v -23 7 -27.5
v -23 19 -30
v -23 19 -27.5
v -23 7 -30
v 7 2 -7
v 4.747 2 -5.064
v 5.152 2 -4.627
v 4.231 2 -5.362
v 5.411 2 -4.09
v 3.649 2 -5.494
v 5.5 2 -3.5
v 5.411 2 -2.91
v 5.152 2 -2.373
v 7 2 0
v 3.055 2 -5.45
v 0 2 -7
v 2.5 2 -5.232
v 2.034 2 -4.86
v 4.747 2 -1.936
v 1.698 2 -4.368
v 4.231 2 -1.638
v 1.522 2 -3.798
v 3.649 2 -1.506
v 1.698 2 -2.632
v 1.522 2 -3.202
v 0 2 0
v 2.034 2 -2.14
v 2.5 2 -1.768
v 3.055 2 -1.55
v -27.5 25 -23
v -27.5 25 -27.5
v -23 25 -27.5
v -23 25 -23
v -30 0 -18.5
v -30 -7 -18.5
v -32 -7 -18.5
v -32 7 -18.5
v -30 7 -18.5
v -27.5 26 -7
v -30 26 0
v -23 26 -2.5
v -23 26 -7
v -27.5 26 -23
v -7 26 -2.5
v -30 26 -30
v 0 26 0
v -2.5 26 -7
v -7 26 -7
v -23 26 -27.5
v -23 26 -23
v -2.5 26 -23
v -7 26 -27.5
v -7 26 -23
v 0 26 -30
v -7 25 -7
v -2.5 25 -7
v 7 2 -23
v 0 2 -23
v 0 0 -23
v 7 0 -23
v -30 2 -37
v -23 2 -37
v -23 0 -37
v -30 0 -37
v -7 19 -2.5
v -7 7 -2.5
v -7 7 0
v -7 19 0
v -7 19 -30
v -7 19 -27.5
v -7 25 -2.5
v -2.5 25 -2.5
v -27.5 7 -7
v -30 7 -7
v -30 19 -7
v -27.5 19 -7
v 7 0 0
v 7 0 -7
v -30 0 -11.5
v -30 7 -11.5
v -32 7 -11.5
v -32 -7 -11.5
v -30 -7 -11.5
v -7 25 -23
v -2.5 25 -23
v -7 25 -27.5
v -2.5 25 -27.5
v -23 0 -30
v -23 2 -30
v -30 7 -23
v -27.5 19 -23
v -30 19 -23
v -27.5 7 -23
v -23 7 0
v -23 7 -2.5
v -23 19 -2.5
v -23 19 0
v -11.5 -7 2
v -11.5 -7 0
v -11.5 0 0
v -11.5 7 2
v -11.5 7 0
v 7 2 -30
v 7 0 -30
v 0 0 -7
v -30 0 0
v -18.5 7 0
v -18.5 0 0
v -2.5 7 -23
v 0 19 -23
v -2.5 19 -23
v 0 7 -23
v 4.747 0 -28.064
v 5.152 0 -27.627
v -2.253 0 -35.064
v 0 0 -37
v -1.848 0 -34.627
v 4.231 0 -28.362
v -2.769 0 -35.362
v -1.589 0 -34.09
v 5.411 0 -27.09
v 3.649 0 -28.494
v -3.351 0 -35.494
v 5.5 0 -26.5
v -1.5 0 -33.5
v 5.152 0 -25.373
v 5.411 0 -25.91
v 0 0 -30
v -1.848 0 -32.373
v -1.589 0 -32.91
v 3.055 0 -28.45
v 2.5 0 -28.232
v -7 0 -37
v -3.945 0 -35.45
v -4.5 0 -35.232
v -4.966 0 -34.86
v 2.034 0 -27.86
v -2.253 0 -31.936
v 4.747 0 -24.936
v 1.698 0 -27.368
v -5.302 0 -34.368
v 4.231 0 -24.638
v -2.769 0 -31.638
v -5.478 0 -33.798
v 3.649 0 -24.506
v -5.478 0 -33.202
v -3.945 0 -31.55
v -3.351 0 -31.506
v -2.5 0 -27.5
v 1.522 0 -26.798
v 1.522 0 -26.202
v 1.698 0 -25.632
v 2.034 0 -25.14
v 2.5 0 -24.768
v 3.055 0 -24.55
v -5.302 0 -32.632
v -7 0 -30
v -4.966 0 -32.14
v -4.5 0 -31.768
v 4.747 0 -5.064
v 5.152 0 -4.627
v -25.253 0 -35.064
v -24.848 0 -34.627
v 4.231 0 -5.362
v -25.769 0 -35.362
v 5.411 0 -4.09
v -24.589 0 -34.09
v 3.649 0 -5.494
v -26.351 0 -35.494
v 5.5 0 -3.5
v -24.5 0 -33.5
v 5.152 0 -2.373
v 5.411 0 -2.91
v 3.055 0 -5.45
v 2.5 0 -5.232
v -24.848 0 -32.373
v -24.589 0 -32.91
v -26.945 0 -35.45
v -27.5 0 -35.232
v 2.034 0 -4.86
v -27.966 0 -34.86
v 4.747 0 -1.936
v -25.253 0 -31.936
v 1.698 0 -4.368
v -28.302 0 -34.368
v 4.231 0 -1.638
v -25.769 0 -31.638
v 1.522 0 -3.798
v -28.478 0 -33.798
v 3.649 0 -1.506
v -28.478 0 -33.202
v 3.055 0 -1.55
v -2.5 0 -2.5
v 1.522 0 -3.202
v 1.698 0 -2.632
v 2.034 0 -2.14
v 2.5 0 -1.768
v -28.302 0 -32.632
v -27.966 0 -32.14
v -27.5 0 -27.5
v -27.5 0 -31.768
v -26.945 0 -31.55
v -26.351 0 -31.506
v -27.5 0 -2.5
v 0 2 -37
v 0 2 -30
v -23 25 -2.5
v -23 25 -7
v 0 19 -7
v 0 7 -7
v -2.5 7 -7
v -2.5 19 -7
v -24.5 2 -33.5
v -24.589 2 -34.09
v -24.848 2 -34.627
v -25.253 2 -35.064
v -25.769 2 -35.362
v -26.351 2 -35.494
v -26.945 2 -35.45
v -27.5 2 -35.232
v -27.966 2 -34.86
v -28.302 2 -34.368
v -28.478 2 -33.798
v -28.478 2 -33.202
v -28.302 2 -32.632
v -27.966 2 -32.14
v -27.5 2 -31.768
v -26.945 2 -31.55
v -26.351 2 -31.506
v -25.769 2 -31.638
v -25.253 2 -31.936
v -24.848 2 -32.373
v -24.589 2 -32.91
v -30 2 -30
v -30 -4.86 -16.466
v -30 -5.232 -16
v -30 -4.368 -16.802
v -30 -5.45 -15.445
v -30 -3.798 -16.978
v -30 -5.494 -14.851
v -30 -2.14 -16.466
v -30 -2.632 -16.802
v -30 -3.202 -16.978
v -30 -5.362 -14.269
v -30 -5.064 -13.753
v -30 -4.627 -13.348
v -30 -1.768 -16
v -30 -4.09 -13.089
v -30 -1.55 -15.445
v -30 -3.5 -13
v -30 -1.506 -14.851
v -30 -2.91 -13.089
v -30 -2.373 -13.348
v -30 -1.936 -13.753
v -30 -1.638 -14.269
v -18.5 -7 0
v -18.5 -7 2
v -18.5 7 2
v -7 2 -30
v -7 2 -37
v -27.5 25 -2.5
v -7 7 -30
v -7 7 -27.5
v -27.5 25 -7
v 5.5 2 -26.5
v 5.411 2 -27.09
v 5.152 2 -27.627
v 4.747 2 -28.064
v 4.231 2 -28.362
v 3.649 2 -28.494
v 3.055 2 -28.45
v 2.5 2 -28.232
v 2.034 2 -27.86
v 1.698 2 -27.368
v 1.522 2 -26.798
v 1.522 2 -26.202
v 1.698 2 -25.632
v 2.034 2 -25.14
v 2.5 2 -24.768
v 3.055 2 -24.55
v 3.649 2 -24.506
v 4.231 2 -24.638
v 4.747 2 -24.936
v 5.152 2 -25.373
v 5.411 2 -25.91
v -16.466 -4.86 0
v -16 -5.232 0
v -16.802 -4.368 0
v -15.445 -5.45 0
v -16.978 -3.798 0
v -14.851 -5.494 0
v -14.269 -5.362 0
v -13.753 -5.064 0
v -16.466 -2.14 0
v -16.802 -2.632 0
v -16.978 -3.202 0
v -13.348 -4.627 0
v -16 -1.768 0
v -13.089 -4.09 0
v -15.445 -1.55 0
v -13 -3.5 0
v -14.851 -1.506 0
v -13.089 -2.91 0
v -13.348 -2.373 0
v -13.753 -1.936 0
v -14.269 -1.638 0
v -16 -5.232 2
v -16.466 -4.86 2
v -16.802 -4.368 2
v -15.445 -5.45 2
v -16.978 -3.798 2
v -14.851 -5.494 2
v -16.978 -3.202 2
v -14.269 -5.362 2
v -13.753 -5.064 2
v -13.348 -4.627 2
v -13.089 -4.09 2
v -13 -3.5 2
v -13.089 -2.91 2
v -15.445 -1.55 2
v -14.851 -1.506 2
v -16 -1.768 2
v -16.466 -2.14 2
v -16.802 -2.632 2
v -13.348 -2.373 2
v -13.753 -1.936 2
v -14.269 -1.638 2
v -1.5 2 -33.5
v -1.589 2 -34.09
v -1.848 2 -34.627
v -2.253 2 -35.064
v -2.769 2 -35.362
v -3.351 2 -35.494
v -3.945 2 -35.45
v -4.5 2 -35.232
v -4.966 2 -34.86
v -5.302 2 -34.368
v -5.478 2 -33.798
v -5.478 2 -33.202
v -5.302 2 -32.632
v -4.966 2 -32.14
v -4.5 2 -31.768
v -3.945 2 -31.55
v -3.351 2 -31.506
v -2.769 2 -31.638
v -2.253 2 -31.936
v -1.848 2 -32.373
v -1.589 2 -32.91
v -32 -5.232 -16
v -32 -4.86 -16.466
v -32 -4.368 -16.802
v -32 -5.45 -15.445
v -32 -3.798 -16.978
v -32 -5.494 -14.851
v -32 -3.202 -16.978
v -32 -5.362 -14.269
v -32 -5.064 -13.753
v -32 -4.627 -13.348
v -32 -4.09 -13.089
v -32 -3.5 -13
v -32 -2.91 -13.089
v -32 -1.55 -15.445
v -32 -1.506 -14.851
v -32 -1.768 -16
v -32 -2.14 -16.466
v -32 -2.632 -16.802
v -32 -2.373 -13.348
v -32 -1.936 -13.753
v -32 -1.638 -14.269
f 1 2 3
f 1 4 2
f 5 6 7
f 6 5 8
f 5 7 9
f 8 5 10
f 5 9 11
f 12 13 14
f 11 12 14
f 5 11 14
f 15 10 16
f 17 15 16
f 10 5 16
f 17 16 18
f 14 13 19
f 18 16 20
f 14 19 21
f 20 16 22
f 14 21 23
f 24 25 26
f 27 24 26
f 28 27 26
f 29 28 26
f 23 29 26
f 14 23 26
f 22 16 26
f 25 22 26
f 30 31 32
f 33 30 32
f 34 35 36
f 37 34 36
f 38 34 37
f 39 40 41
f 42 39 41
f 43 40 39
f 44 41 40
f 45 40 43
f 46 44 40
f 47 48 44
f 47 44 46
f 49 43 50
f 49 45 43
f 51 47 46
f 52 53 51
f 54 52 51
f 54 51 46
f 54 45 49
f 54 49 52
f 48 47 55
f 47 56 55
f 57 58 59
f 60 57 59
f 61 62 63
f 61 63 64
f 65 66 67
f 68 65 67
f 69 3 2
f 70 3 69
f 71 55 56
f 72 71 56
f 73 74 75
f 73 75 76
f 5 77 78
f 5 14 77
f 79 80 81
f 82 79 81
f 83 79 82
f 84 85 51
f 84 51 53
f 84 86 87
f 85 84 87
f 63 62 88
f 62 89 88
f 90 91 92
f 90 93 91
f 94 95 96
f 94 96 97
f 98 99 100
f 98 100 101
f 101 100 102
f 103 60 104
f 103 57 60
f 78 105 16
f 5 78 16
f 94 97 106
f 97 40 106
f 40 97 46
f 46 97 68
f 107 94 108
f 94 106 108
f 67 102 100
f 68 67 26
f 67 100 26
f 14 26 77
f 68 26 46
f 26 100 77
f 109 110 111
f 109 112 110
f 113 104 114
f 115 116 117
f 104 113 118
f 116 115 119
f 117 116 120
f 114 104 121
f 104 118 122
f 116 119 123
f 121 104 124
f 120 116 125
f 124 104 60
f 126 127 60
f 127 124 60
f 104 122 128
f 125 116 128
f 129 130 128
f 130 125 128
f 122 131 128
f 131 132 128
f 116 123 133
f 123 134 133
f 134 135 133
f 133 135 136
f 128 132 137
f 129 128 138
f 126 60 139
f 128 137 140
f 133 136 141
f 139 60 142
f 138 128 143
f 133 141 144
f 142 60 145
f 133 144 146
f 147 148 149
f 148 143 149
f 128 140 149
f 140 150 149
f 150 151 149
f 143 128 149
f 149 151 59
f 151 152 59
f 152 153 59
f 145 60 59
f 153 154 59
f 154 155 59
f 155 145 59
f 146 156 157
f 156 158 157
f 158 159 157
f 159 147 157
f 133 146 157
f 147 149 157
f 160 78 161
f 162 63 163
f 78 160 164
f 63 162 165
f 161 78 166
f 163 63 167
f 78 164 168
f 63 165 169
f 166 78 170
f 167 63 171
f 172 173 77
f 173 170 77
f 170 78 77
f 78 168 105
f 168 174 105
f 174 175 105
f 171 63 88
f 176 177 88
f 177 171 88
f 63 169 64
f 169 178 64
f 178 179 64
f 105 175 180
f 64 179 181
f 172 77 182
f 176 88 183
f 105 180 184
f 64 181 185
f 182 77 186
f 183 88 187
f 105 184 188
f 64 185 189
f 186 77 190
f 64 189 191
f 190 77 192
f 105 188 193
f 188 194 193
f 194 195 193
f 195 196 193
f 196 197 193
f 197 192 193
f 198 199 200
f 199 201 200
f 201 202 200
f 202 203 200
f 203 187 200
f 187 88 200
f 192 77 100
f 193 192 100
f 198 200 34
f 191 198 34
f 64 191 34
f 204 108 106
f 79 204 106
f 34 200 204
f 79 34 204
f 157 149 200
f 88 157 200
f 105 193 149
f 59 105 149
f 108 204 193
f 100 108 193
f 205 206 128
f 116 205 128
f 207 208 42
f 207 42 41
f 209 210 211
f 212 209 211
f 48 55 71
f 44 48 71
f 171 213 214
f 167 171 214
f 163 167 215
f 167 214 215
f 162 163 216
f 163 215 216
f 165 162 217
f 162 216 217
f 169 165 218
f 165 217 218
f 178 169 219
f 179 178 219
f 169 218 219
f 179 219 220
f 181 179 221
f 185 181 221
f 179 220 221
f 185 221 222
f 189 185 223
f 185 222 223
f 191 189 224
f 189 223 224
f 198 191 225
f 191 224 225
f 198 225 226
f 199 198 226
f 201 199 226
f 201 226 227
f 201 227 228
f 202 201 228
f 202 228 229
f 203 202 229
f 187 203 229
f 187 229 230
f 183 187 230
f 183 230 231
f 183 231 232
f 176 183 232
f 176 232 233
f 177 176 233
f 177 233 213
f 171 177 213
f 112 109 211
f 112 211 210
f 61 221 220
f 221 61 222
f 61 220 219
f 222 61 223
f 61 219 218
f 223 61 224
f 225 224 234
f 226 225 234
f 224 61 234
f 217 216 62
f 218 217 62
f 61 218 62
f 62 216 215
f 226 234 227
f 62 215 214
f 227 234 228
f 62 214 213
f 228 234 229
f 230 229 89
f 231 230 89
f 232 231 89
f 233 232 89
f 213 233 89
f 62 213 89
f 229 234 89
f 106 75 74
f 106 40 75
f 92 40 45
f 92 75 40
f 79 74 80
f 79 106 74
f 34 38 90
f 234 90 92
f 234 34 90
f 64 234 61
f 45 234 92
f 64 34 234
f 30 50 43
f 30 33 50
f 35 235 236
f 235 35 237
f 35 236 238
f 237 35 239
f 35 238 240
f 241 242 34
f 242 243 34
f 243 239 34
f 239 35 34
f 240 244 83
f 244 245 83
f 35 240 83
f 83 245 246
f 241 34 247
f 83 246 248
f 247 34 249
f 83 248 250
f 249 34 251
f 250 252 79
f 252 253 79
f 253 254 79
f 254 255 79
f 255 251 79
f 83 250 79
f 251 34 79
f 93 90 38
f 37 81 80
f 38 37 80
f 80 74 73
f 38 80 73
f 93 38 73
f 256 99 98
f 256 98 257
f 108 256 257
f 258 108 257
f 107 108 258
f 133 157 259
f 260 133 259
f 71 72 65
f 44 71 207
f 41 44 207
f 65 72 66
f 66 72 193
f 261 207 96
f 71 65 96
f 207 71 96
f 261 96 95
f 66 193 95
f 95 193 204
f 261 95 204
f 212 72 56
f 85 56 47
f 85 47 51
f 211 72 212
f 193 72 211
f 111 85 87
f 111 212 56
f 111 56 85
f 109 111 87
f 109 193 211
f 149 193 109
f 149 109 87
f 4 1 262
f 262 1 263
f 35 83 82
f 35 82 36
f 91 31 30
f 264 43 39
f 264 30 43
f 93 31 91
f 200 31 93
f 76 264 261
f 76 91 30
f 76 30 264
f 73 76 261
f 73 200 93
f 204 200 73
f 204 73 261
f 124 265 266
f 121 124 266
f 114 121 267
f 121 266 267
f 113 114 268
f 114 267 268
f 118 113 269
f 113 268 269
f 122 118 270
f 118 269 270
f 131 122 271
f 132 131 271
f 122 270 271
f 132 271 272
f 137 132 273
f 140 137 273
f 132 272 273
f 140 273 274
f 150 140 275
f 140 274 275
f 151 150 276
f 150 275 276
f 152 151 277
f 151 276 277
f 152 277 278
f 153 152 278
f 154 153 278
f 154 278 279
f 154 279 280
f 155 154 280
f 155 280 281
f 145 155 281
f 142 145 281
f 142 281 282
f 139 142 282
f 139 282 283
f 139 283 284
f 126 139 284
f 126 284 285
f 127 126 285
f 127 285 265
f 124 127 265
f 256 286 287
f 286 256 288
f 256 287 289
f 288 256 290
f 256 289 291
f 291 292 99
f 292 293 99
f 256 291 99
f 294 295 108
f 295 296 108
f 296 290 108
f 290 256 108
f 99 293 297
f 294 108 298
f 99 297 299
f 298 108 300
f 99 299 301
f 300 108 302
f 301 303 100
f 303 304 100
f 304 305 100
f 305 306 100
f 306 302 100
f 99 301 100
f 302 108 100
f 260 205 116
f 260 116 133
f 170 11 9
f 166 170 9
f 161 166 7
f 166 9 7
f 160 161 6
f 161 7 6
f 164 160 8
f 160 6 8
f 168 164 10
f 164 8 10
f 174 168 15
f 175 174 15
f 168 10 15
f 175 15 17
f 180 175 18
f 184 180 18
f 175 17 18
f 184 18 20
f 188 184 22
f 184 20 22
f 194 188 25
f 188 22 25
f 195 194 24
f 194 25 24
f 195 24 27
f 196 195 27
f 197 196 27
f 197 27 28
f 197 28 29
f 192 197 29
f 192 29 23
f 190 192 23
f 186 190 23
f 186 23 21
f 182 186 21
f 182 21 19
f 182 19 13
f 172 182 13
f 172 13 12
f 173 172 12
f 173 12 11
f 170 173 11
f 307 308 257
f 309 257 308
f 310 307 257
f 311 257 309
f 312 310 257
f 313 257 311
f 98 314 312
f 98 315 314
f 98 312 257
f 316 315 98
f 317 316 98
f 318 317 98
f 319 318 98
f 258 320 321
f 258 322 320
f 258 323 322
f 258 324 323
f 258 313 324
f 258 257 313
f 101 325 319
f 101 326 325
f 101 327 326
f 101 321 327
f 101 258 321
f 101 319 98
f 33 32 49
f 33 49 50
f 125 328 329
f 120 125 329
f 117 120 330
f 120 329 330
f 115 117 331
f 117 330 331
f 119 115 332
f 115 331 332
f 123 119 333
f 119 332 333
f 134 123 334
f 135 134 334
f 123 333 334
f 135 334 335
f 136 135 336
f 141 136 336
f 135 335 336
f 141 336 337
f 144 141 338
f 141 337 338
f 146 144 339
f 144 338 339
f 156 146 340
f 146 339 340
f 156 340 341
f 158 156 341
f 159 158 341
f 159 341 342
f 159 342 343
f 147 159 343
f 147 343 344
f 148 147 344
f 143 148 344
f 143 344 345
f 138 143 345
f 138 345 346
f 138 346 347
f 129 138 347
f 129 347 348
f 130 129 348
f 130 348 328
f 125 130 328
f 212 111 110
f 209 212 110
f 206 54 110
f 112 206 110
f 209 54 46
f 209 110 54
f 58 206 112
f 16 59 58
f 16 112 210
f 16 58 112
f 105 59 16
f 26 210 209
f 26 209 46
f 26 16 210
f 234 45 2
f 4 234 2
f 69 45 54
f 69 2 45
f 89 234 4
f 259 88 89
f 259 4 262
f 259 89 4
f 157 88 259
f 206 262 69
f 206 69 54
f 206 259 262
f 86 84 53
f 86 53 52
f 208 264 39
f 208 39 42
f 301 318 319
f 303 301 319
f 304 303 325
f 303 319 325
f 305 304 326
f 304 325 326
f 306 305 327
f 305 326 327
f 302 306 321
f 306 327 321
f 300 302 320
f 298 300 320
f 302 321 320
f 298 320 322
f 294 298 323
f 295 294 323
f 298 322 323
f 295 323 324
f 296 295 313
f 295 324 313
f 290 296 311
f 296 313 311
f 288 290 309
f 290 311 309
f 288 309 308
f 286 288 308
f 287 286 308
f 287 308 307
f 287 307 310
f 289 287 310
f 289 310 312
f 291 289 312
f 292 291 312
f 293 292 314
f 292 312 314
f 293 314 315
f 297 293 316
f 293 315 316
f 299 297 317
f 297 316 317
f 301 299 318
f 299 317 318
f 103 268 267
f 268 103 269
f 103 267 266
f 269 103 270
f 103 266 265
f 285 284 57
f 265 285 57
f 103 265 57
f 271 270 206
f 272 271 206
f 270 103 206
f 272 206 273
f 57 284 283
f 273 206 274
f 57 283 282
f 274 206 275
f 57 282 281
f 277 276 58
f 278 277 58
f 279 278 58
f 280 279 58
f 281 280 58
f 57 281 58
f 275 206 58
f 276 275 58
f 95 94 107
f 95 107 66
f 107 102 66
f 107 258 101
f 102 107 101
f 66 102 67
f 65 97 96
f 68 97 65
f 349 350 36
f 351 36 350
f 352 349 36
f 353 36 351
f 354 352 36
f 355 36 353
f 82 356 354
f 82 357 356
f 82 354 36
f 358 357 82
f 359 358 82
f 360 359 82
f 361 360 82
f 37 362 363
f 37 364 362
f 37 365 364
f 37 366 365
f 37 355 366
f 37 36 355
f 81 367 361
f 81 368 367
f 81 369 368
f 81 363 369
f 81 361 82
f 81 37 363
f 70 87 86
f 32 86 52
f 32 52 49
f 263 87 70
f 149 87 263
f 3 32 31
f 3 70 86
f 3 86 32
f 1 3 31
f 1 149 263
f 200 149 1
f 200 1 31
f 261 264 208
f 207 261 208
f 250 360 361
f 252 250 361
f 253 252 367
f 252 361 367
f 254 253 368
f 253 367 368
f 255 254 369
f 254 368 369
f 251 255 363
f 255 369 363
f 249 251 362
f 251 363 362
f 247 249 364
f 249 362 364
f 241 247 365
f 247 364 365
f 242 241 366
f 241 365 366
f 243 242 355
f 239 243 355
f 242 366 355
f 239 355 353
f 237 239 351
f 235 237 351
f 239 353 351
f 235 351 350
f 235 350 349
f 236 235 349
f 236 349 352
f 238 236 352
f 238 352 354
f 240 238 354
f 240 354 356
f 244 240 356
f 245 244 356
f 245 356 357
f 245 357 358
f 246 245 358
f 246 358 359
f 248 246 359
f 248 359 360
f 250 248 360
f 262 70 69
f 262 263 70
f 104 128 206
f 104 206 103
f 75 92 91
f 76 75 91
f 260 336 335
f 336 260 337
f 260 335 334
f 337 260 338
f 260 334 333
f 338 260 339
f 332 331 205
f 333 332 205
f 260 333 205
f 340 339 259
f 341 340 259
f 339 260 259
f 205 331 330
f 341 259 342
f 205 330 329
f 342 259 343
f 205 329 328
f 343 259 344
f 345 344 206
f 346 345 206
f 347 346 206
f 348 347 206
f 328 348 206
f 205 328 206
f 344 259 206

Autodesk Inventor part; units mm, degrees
ref_plane "YZ Plane" through (0, 0, 0) normal (1, 0, 0) x (0, 1, 0)
ref_plane "XZ Plane" through (0, 0, 0) normal (0, 1, 0) x (-1, 0, 0)
ref_plane "XY Plane" through (0, 0, 0) normal (0, 0, 1) x (1, 0, 0)
sketch "Sketch1" plane through (0, 0, 0) normal (0, 1, 0) x (-1, 0, 0)
  line L0 (0, 0) -> (0, -7)
  line L1 (0, -7) -> (2.5, -7)
  line L2 (2.5, -7) -> (2.5, -2.5)
  line L3 (2.5, -2.5) -> (7, -2.5)
  line L4 (7, -2.5) -> (7, 0)
  line L5 (7, 0) -> (0, 0)
  line L6 (0, -30) -> (0, -23)
  line L7 (0, -23) -> (2.5, -23)
  line L8 (2.5, -23) -> (2.5, -27.5)
  line L9 (2.5, -27.5) -> (7, -27.5)
  line L10 (7, -27.5) -> (7, -30)
  line L11 (7, -30) -> (0, -30)
  line L12 (23, 0) -> (30, 0)
  line L13 (30, 0) -> (30, -7)
  line L14 (30, -7) -> (27.5, -7)
  line L15 (27.5, -7) -> (27.5, -2.5)
  line L16 (27.5, -2.5) -> (23, -2.5)
  line L17 (23, -2.5) -> (23, 0)
  line L18 (30, -23) -> (30, -30)
  line L19 (30, -30) -> (23, -30)
  line L20 (23, -30) -> (23, -27.5)
  line L21 (23, -27.5) -> (27.5, -27.5)
  line L22 (27.5, -27.5) -> (27.5, -23)
  line L23 (27.5, -23) -> (30, -23)
  dimension "d0" = 7
  dimension "d1" = 2.5
  dimension "d2" = 4.5
  dimension "d3" = 4.5
  dimension "d8" = 7
  dimension "d9" = 4.5
  dimension "d10" = 7
  dimension "d11" = 7
  dimension "d12" = 2.5
  dimension "d13" = 30
  dimension "d14" = 30
  dimension "d15" = 30
  dimension "d16" = 2.5
  dimension "d17" = 2.5
  dimension "d18" = 4.5
  dimension "d19" = 7
extrude "Extrusion1" add sketch "Sketch1" along normal blind 25
sketch "Sketch2" plane through (0, 0, 0) normal (0, -1, 0) x (1, 0, 0)
  line L0 (0, 0) -> (-30, 0)
  line L1 (-30, 0) -> (-30, -30)
  line L2 (-30, -30) -> (0, -30)
  line L3 (0, -30) -> (0, 0)
  line L4 (-27.5, -2.5) -> (-2.5, -2.5)
  line L5 (-2.5, -2.5) -> (-2.5, -27.5)
  line L6 (-2.5, -27.5) -> (-27.5, -27.5)
  line L7 (-27.5, -27.5) -> (-23, -27.5) projected
  line L8 (-27.5, -27.5) -> (-27.5, -2.5)
extrude "Extrusion2" add sketch "Sketch2" against normal blind 7
sketch "Sketch3" plane through (0, 25, 0) normal (0, 1, 0) x (1, 0, 0)
  line L0 (0, 0) -> (-7, 0)
  line L1 (0, 0) -> (-30, 0) projected
  line L2 (-7, 0) -> (-7, 7)
  line L3 (-7, 7) -> (0, 7)
  line L4 (0, 7) -> (0, 0)
  line L5 (0, 30) -> (-7, 30)
  line L6 (-7, 30) -> (-7, 23)
  line L7 (-7, 23) -> (0, 23)
  line L8 (-2.5, 23) -> (0, 23) projected
  line L9 (0, 23) -> (0, 30)
  line L10 (0, 23) -> (0, 30) projected
  line L11 (-30, 30) -> (-30, 23)
  line L12 (-30, 0) -> (-30, 30) projected
  line L13 (-30, 23) -> (-23, 23)
  line L14 (-23, 23) -> (-23, 30)
  line L15 (-23, 30) -> (-30, 30)
  line L16 (-30, 30) -> (0, 30) projected
  line L17 (-30, 0) -> (-23, 0)
  line L18 (-23, 0) -> (-23, 7)
  line L19 (-23, 7) -> (-30, 7)
  line L20 (-27.5, 7) -> (-30, 7) projected
  line L21 (-30, 7) -> (-30, 0)
  dimension "d24" = 7
  dimension "d25" = 7
  dimension "d26" = 7
  dimension "d27" = 7
  dimension "d28" = 7
extrude "Extrusion3" add sketch "Sketch3" along normal blind 1
sketch "Sketch4" plane through (0, 0, 0) normal (1, 0, 0) x (0, 0, -1)
  line L0 (0, 0) -> (7, 0)
  line L1 (27.5, 0) -> (2.5, 0) projected
  line L2 (7, 0) -> (7, 2)
  line L3 (7, 2) -> (0, 2)
  line L4 (0, 2) -> (0, 0)
  line L5 (30, 0) -> (30, 2)
  line L6 (30, 0) -> (30, 26) projected
  line L7 (30, 2) -> (23, 2)
  line L8 (23, 2) -> (23, 0)
  line L9 (0, 0) -> (30, 0) projected
  line L10 (23, 0) -> (30, 0)
  dimension "d31" = 7
  dimension "d32" = 2
  dimension "d33" = 2
  dimension "d34" = 7
sketch "Sketch5" plane through (0, 0, -30) normal (0, 0, -1) x (-1, 0, 0)
  line L0 (0, 0) -> (7, 0)
  line L1 (7, 0) -> (7, 2)
  line L2 (7, 2) -> (0, 2)
  line L3 (0, 2) -> (0, 0)
  line L4 (30, 0) -> (30, 2)
  line L5 (30, 0) -> (30, 26) projected
  line L6 (30, 2) -> (23, 2)
  line L7 (23, 2) -> (23, 0)
  line L8 (23, 0) -> (30, 0)
  line L9 (30, 0) -> (0, 0) projected
  dimension "d35" = 7
  dimension "d36" = 2
  dimension "d37" = 2
  dimension "d38" = 7
extrude "Extrusion4" add sketch "Sketch4" along normal blind 7
extrude "Extrusion5" add sketch "Sketch5" along normal blind 7
sketch "Sketch6" plane through (0, 2, 0) normal (0, 1, 0) x (1, 0, 0)
  circle A0 centre (3.5, 3.5) radius 2
  line L0 (7, 7) -> (7, 0) projected
  line L1 (0, 0) -> (7, 0) projected
  point P0 (7, 3.5)
  point P1 (3.5, 0)
  dimension "d43" = 4
sketch "Sketch7" plane through (0, 2, -23) normal (0, 1, 0) x (1, 0, 0)
  circle A0 centre (3.5, 3.5) radius 2
  line L0 (7, 7) -> (7, 0) projected
  line L1 (0, 0) -> (7, 0) projected
  point P0 (0, -23)
  point P1 (7, 3.5)
  point P2 (3.5, 0)
  dimension "d44" = 4
sketch "Sketch8" plane through (-7, 2, -30) normal (0, 1, 0) x (1, 0, 0)
  circle A0 centre (3.5, 3.5) radius 2
  circle A1 centre (-19.5, 3.5) radius 2
  line L0 (7, 0) -> (7, 7) projected
  line L1 (7, 0) -> (0, 0) projected
  line L2 (-23, 0) -> (-23, 7) projected
  line L3 (-23, 7) -> (-16, 7) projected
  point P0 (7, -30)
  point P1 (7, 3.5)
  point P2 (3.5, 0)
  point P3 (-23, 3.5)
  point P4 (-19.5, 7)
  dimension "d45" = 4
  dimension "d46" = 4
extrude "Extrusion6" cut sketch "Sketch6" against normal blind 2
extrude "Extrusion7" cut sketch "Sketch7" against normal blind 2
extrude "Extrusion8" cut sketch "Sketch8" against normal blind 2
sketch "Sketch9" plane through (0, 25, 0) normal (0, -1, 0) x (1, 0, 0)
  line L0 (0, -30) -> (0, 0)
  line L1 (0, 0) -> (-30, 0)
  line L2 (-30, 0) -> (-30, -30)
  line L3 (-30, 0) -> (-30, -37) projected
  line L4 (-2.5, -2.5) -> (-2.5, -27.5)
  line L5 (-2.5, -27.5) -> (-27.5, -27.5)
  line L6 (-27.5, -27.5) -> (-23, -27.5) projected
  line L7 (-27.5, -27.5) -> (-27.5, -2.5)
  line L8 (-27.5, -2.5) -> (-2.5, -2.5)
  line L9 (-2.5, -2.5) -> (-7, -2.5) projected
  line L10 (0, -30) -> (-30, -30)
extrude "Extrusion9" add sketch "Sketch9" along normal blind 6 and the other way blind 1
sketch "Sketch10" plane through (-30, 0, 0) normal (-1, 0, 0) x (0, 0, 1)
  line L0 (0, 0) -> (-11.5, 0)
  line L1 (0, 0) -> (-37, 0) projected
  line L2 (-11.5, 0) -> (-18.5, 0)
  line L3 (-27.5, 0) -> (-2.5, 0) projected
  line L4 (-18.5, 0) -> (-30, 0)
  line L5 (-18.5, 0) -> (-18.5, 7)
  line L6 (-7, 7) -> (-23, 7) projected
  line L7 (-11.5, 0) -> (-11.5, 7)
  line L8 (-18.5, 7) -> (-11.5, 7)
  line L9 (-11.5, 0) -> (-11.5, -7)
  line L10 (-11.5, -7) -> (-18.5, -7)
  line L11 (-18.5, -7) -> (-18.5, 0)
  dimension "d57" = 11.5
  dimension "d58" = 7
  dimension "d59" = 7
extrude "Extrusion10" add sketch "Sketch10" along normal blind 2
sketch "Sketch11" plane through (-30, 26, 0) normal (0, 0, 1) x (1, 0, 0)
  line L0 (0, -26) -> (11.5, -26)
  line L1 (2.5, -26) -> (27.5, -26) projected
  line L2 (11.5, -26) -> (18.5, -26)
  line L3 (18.5, -26) -> (18.5, -33)
  line L4 (18.5, -33) -> (11.5, -33)
  line L5 (11.5, -33) -> (11.5, -26)
  line L6 (23, -19) -> (7, -19) projected
  line L7 (11.5, -19) -> (18.5, -19)
  line L8 (18.5, -26) -> (18.5, -19)
  line L9 (11.5, -26) -> (11.5, -19)
  point P0 (30, -26)
  dimension "d62" = 11.5
  dimension "d63" = 7
  dimension "d64" = 7
extrude "Extrusion11" add sketch "Sketch11" along normal blind 2
sketch "Sketch12" plane through (-32, 0, 0) normal (-1, 0, 0) x (0, 0, 1)
  circle A0 centre (-15, -3.5) radius 2
  line L0 (-18.5, -7) -> (-11.5, -7) projected
  line L1 (-11.5, -7) -> (-11.5, 0) projected
  point P0 (0, 0)
  point P1 (-15, -7)
  point P2 (-11.5, -3.5)
  dimension "d67" = 4
sketch "Sketch13" plane through (-30, 26, 2) normal (0, 0, 1) x (1, 0, 0)
  circle A0 centre (15, -29.5) radius 2
  line L0 (11.5, -26) -> (11.5, -33) projected
  line L1 (11.5, -33) -> (18.5, -33) projected
  point P0 (30, -26)
  point P1 (11.5, -29.5)
  point P2 (15, -33)
  dimension "d68" = 4
extrude "Extrusion12" cut sketch "Sketch12" against normal blind 2
extrude "Extrusion13" cut sketch "Sketch13" against normal blind 2
properties part number "ygolki" material "Bronze, Soft Tin"
